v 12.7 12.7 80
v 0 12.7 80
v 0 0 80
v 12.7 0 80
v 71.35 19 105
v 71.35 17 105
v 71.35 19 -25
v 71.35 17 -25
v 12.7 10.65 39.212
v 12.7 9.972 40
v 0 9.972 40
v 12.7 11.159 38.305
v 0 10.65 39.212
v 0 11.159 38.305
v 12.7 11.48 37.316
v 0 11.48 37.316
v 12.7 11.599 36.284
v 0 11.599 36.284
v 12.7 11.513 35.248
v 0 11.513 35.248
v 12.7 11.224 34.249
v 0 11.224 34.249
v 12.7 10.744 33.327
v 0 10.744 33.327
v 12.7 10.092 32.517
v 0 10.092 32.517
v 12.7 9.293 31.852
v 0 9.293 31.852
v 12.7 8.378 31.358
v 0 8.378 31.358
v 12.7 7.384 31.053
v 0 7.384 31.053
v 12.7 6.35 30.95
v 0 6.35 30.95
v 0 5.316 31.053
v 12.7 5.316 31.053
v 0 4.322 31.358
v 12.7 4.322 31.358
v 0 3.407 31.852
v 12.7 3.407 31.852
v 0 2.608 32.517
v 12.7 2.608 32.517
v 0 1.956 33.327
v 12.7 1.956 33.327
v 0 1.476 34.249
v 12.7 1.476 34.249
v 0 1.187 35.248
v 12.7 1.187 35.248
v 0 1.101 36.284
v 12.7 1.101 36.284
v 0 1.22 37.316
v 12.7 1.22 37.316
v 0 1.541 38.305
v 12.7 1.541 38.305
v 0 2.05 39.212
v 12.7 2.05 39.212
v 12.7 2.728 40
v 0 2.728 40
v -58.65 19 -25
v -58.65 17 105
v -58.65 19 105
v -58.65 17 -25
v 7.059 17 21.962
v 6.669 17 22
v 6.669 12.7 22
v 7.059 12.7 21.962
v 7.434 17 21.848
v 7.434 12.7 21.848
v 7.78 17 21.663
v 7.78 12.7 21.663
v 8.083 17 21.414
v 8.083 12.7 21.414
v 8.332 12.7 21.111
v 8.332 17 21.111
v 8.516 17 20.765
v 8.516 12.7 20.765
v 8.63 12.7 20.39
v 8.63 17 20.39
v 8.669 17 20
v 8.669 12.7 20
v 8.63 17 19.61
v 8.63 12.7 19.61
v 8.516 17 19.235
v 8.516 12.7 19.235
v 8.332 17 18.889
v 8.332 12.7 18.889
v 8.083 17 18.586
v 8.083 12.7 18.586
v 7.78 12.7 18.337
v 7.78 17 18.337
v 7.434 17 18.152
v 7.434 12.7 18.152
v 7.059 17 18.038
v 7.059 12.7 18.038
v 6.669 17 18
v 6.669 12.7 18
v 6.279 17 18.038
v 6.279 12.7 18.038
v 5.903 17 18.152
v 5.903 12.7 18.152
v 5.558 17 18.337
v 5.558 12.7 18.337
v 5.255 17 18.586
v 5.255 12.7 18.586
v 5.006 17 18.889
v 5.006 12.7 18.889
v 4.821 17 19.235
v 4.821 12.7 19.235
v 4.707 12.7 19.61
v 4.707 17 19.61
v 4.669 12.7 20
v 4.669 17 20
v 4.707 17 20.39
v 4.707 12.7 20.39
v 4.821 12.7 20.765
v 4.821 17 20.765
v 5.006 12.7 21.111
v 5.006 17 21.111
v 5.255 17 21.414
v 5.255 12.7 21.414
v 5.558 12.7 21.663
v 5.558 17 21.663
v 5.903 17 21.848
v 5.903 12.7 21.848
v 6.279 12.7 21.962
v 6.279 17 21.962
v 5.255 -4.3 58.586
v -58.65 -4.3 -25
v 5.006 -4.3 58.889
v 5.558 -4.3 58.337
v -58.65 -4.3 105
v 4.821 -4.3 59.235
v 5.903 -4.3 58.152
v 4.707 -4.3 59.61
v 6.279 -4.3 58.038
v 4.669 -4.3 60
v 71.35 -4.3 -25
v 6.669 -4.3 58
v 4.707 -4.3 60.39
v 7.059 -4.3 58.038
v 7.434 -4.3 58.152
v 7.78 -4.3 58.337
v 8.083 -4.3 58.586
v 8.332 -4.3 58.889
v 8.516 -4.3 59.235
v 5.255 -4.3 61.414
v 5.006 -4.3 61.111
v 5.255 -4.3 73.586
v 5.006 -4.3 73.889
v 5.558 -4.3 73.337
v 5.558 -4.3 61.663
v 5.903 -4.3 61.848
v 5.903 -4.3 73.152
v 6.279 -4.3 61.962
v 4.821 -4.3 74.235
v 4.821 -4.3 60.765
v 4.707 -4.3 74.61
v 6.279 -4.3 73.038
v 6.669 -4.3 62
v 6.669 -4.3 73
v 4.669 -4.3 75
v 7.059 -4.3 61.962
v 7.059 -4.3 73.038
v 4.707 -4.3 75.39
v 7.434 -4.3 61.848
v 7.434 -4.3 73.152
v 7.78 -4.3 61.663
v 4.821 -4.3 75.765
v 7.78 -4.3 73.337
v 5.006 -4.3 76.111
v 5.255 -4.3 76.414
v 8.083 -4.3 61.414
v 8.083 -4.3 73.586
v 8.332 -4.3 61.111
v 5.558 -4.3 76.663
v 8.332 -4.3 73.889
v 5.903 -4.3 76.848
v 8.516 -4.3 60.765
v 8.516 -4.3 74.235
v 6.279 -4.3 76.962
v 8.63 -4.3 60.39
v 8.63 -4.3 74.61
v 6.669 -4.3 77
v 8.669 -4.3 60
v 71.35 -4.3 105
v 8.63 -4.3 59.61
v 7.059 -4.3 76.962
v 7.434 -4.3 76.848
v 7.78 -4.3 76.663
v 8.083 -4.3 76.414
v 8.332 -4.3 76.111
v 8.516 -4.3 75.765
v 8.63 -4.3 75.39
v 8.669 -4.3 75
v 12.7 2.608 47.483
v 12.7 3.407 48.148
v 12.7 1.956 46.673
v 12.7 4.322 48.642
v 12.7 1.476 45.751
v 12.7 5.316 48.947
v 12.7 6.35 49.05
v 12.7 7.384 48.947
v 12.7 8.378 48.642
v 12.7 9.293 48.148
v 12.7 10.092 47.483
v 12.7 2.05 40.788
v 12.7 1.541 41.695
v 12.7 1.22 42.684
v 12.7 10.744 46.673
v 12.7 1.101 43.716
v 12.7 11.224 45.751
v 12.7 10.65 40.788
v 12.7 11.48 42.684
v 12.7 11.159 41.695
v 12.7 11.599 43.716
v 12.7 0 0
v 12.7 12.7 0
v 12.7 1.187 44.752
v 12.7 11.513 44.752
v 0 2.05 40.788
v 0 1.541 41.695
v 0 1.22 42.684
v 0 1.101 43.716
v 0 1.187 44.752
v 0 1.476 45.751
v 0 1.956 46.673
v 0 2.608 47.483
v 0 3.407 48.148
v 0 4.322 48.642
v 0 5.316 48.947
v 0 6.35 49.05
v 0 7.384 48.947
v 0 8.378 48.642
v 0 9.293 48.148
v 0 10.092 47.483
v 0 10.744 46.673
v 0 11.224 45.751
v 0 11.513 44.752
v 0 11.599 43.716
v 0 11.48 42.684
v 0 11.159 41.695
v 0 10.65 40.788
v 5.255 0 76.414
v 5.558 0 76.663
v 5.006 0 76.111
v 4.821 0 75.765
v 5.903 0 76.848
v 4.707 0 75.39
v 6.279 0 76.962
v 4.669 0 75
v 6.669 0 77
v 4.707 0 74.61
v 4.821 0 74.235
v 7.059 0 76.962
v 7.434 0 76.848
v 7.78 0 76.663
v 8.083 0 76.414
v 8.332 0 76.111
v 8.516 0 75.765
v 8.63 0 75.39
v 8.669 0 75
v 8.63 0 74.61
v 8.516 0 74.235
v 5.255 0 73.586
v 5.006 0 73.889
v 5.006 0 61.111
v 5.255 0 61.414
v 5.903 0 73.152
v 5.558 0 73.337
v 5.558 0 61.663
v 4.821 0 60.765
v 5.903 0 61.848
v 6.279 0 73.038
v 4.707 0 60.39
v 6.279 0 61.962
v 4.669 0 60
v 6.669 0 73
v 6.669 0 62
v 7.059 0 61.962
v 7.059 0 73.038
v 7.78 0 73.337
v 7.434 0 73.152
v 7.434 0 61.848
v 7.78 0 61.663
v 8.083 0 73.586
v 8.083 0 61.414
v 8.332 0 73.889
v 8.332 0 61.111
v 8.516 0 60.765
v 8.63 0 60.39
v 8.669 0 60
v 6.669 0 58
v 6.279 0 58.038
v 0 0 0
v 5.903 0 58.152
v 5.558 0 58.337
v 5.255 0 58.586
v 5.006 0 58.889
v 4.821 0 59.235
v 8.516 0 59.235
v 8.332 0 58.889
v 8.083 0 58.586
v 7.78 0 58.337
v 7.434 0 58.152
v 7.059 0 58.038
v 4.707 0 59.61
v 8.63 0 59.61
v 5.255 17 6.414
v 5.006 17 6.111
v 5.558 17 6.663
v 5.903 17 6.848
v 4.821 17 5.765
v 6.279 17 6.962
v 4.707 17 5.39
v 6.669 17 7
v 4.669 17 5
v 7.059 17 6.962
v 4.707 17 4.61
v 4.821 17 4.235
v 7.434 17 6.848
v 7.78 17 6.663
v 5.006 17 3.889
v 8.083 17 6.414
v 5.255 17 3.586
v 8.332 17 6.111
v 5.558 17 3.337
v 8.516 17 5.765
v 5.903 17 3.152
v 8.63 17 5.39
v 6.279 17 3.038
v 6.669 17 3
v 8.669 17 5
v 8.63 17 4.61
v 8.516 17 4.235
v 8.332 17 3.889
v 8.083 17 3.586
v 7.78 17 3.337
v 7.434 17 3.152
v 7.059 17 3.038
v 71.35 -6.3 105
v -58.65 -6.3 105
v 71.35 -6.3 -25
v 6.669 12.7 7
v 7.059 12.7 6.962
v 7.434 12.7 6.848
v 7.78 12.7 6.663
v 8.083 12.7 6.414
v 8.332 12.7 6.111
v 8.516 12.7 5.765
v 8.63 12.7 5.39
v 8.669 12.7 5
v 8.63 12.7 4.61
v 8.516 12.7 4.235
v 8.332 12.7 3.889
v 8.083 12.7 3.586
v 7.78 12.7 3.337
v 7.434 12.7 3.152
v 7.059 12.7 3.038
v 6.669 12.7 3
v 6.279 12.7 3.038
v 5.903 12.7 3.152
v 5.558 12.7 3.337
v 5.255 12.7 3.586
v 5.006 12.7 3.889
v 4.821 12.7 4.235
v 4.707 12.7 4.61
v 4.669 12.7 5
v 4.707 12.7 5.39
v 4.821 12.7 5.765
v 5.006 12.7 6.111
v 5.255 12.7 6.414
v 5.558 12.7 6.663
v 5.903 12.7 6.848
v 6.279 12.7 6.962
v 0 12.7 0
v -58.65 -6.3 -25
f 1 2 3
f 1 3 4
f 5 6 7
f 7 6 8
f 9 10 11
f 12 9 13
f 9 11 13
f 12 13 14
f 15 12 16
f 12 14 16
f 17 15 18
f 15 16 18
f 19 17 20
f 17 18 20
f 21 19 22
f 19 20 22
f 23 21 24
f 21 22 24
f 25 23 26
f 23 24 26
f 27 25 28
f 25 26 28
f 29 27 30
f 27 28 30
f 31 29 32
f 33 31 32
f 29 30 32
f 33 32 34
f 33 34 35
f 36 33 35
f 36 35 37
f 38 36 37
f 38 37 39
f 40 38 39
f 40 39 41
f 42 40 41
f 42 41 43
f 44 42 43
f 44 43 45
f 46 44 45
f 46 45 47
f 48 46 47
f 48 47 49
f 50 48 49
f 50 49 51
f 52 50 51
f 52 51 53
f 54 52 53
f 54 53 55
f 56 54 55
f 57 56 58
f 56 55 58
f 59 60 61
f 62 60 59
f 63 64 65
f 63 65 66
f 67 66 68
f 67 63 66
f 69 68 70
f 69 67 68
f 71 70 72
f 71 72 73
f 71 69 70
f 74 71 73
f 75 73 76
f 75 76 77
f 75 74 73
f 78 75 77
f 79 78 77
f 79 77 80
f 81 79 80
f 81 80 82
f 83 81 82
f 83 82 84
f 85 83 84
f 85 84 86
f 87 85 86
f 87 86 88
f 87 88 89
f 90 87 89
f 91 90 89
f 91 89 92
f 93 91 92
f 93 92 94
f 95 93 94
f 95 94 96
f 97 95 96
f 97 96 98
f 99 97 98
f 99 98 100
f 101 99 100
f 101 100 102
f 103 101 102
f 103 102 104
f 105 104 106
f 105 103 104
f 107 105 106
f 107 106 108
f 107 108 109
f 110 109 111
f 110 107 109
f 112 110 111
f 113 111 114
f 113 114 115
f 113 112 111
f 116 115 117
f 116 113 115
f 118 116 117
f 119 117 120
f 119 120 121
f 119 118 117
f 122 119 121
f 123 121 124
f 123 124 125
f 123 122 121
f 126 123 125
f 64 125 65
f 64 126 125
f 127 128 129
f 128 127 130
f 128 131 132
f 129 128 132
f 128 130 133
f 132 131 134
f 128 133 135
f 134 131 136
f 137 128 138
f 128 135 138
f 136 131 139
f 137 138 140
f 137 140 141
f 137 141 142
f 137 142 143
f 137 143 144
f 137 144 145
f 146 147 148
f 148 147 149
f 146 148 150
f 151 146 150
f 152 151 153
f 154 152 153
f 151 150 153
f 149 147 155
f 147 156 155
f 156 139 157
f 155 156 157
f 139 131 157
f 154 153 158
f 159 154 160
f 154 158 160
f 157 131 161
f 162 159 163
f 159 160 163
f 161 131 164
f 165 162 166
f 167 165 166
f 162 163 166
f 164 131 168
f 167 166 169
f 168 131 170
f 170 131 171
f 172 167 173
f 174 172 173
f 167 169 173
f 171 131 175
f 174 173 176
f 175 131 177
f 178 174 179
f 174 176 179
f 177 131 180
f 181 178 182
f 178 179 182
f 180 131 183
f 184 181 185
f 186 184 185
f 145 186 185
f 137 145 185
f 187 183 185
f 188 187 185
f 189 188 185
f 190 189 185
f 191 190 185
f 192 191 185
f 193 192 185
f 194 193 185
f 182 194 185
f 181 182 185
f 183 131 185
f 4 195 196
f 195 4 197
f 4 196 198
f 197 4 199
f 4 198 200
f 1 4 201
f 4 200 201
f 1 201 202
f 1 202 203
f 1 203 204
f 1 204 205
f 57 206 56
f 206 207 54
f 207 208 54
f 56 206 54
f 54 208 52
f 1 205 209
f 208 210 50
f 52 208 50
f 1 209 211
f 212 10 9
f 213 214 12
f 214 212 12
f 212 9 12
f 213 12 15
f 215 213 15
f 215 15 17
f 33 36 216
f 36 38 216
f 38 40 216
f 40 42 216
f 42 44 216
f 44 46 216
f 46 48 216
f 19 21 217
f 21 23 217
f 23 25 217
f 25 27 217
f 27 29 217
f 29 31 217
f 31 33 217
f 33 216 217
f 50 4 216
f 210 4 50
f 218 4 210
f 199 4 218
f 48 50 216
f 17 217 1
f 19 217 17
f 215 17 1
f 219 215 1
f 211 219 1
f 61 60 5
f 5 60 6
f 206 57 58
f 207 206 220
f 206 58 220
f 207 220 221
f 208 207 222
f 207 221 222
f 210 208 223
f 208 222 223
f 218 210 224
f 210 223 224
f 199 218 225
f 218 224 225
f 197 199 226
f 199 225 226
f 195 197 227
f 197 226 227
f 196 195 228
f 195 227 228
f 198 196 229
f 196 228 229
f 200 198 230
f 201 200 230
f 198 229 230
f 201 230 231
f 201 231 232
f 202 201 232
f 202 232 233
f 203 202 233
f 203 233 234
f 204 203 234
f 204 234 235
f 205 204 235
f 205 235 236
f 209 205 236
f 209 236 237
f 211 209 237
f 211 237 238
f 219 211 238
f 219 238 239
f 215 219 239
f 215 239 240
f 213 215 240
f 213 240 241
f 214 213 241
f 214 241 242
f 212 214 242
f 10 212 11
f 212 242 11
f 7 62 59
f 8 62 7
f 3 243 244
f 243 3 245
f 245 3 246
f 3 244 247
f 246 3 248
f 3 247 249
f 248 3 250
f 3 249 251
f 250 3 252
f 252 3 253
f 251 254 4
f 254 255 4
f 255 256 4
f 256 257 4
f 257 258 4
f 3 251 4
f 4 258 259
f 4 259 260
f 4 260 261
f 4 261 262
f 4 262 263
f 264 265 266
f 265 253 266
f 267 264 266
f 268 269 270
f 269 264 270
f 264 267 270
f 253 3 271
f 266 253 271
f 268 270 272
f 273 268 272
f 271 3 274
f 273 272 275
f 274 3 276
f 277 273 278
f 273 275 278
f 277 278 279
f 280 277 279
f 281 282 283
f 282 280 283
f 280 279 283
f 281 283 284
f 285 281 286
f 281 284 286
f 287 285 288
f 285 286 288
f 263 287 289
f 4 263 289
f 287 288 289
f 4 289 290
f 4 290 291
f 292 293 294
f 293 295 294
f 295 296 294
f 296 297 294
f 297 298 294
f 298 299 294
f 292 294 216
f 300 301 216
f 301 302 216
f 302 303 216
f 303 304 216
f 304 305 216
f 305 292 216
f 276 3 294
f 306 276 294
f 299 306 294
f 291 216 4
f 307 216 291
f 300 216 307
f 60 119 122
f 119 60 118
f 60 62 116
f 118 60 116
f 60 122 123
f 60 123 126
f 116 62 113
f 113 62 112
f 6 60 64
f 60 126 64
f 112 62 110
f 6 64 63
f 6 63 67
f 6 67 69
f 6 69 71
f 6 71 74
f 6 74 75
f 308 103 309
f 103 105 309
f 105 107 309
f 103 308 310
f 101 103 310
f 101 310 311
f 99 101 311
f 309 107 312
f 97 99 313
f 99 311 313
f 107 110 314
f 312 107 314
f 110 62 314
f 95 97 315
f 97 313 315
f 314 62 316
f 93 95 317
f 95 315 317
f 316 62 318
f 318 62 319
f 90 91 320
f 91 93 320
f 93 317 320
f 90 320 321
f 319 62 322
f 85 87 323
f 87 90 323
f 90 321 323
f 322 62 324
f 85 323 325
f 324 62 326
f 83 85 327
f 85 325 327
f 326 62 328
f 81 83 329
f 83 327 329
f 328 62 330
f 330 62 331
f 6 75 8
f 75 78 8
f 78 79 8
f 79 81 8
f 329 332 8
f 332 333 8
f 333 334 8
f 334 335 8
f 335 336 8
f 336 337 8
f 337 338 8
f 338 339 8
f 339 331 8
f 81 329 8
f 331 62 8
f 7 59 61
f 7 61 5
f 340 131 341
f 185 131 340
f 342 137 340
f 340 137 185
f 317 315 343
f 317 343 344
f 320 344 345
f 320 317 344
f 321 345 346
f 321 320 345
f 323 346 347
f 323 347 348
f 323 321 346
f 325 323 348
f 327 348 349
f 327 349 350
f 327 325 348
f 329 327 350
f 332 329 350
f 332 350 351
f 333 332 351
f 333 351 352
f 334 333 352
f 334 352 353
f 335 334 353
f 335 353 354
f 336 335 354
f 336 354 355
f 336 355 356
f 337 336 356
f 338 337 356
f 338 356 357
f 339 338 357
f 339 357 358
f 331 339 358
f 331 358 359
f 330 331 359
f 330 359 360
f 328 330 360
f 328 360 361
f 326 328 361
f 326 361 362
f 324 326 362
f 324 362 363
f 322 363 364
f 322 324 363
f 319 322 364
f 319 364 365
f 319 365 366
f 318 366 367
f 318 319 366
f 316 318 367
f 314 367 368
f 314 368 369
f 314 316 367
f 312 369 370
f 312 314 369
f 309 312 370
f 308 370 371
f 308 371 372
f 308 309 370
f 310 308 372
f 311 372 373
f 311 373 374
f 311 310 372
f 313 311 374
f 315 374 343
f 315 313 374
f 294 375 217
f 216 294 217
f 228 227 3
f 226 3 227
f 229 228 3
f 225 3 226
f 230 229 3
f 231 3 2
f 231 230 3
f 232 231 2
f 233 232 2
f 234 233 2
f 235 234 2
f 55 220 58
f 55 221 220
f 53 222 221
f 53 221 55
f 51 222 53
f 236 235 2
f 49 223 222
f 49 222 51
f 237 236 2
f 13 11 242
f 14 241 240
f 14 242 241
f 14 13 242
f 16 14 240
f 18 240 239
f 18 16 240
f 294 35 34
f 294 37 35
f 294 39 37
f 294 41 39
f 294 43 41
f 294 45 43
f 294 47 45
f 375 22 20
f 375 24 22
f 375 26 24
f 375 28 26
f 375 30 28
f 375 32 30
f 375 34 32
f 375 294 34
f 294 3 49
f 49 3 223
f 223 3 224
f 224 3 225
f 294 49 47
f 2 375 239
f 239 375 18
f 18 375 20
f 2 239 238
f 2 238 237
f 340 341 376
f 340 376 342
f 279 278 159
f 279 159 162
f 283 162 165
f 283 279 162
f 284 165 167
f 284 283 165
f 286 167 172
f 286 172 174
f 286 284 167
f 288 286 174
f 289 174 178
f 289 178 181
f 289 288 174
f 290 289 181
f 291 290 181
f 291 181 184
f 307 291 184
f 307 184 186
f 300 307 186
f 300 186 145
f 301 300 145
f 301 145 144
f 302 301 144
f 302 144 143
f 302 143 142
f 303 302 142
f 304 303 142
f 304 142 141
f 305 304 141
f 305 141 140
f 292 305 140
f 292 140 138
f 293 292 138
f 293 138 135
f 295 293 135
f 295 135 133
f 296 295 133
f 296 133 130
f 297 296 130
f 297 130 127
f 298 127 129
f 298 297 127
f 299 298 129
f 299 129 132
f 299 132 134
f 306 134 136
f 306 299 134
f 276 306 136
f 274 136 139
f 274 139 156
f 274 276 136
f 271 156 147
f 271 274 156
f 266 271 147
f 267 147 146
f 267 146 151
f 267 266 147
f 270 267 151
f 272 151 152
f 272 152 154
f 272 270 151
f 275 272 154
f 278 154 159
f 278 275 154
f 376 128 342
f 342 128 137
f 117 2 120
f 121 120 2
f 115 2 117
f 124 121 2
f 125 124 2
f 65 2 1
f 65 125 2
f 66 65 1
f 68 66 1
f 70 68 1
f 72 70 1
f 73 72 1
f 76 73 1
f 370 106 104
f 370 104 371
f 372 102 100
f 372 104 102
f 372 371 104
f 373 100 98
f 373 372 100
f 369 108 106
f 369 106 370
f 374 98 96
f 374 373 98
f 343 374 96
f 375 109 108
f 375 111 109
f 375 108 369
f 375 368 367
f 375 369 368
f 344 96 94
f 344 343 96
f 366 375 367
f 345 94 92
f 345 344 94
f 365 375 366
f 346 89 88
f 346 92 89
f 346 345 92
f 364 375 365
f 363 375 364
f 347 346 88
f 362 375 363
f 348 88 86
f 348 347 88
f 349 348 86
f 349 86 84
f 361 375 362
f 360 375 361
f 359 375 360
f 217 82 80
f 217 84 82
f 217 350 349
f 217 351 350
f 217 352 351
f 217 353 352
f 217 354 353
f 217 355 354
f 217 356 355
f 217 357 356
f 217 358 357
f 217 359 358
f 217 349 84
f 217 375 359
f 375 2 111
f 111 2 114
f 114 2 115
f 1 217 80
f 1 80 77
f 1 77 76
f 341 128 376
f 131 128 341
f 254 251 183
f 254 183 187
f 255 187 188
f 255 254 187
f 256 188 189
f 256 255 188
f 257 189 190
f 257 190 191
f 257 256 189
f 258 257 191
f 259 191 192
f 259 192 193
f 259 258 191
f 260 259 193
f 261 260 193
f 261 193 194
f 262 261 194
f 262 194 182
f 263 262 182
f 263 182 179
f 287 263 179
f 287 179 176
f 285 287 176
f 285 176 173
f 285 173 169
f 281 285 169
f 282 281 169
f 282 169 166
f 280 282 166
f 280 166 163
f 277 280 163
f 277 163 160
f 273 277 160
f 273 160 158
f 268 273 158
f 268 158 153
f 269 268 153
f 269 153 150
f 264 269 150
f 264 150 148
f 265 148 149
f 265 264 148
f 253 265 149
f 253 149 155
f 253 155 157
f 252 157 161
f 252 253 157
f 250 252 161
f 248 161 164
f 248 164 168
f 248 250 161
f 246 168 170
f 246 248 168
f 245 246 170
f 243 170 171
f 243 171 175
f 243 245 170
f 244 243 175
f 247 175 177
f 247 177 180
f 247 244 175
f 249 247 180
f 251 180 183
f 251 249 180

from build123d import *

# Parameters (mm, degrees)
SKETCH1_W           = 12.7
SKETCH1_H           = 12.7
BOSS_EXTRUDE1_DEPTH = 80
SKETCH2_R           = 2
CUT_EXTRUDE1_DEPTH  = 82.991341006
CUT_EXTRUDE2_DEPTH  = 82.991341006
BOSS_EXTRUDE2_START = 17
SKETCH5_R           = 2
BOSS_EXTRUDE2_DEPTH = 17
SKETCH6_R           = 2
BOSS_EXTRUDE3_DEPTH = 17
SKETCH7_W           = 130
SKETCH7_H           = 130
BOSS_EXTRUDE4_DEPTH = 2
SKETCH8_W           = 130
SKETCH8_H           = 130
BOSS_EXTRUDE5_DEPTH = 2


with BuildPart() as part:
    # Sketch1 → Boss-Extrude1 (new body)
    with BuildSketch(Plane.XY):
        with Locations((6.35, 6.35)):
            Rectangle(SKETCH1_W, SKETCH1_H)
    extrude(amount=BOSS_EXTRUDE1_DEPTH)

    # Sketch2 → Cut-Extrude1 (cut, through all)
    with BuildSketch(Plane(origin=(0, 12.7, 0), x_dir=(1, 0, 0), z_dir=(0, 1, 0))):
        with Locations(Location((6.668720536, -5, 0), (0, 0, 270))):
            Circle(SKETCH2_R)
        with Locations(Location((6.668720536, -20, 0), (0, 0, 270))):
            Circle(SKETCH2_R)
        with Locations(Location((6.668720536, -60, 0), (0, 0, 270))):
            Circle(SKETCH2_R)
        with Locations(Location((6.668720536, -75, 0), (0, 0, 270))):
            Circle(SKETCH2_R)
    extrude(amount=-CUT_EXTRUDE1_DEPTH, mode=Mode.SUBTRACT)

    # Sketch4 → Cut-Extrude2 (cut, through all)
    with BuildSketch(Plane.ZY):
        with BuildLine():
            ThreePointArc((40, 2.727500863), (49.05, 6.35), (40, 9.972499137))
            ThreePointArc((40, 9.972499137), (30.95, 6.35), (40, 2.727500863))
        make_face()
    extrude(amount=-CUT_EXTRUDE2_DEPTH, mode=Mode.SUBTRACT)

    # Sketch5 → Boss-Extrude2 (add)
    with BuildSketch(Plane(origin=(0, 0, 0), x_dir=(1, 0, 0), z_dir=(0, 1, 0)).offset(BOSS_EXTRUDE2_START)):
        with Locations(Location((6.668720536, -20, 0), (0, 0, 270))):
            Circle(SKETCH5_R)
        with Locations(Location((6.668720536, -5, 0), (0, 0, 270))):
            Circle(SKETCH5_R)
    extrude(amount=-BOSS_EXTRUDE2_DEPTH)

    # Sketch6 → Boss-Extrude3 (add)
    with BuildSketch(Plane(origin=(0, 12.7, 0), x_dir=(1, 0, 0), z_dir=(0, 1, 0))):
        with Locations(Location((6.668720536, -75, 0), (0, 0, 270))):
            Circle(SKETCH6_R)
        with Locations(Location((6.668720536, -60, 0), (0, 0, 270))):
            Circle(SKETCH6_R)
    extrude(amount=-BOSS_EXTRUDE3_DEPTH)

    # Sketch7 → Boss-Extrude4 (add)
    with BuildSketch(Plane(origin=(0, 17, 0), x_dir=(1, 0, 0), z_dir=(0, 1, 0))):
        with Locations((6.35, -40)):
            Rectangle(SKETCH7_W, SKETCH7_H)
    extrude(amount=BOSS_EXTRUDE4_DEPTH)

    # Sketch8 → Boss-Extrude5 (add)
    with BuildSketch(Plane.XZ.offset(4.3)):
        with Locations((6.35, 40)):
            Rectangle(SKETCH8_W, SKETCH8_H)
    extrude(amount=BOSS_EXTRUDE5_DEPTH)


solid = part.part
